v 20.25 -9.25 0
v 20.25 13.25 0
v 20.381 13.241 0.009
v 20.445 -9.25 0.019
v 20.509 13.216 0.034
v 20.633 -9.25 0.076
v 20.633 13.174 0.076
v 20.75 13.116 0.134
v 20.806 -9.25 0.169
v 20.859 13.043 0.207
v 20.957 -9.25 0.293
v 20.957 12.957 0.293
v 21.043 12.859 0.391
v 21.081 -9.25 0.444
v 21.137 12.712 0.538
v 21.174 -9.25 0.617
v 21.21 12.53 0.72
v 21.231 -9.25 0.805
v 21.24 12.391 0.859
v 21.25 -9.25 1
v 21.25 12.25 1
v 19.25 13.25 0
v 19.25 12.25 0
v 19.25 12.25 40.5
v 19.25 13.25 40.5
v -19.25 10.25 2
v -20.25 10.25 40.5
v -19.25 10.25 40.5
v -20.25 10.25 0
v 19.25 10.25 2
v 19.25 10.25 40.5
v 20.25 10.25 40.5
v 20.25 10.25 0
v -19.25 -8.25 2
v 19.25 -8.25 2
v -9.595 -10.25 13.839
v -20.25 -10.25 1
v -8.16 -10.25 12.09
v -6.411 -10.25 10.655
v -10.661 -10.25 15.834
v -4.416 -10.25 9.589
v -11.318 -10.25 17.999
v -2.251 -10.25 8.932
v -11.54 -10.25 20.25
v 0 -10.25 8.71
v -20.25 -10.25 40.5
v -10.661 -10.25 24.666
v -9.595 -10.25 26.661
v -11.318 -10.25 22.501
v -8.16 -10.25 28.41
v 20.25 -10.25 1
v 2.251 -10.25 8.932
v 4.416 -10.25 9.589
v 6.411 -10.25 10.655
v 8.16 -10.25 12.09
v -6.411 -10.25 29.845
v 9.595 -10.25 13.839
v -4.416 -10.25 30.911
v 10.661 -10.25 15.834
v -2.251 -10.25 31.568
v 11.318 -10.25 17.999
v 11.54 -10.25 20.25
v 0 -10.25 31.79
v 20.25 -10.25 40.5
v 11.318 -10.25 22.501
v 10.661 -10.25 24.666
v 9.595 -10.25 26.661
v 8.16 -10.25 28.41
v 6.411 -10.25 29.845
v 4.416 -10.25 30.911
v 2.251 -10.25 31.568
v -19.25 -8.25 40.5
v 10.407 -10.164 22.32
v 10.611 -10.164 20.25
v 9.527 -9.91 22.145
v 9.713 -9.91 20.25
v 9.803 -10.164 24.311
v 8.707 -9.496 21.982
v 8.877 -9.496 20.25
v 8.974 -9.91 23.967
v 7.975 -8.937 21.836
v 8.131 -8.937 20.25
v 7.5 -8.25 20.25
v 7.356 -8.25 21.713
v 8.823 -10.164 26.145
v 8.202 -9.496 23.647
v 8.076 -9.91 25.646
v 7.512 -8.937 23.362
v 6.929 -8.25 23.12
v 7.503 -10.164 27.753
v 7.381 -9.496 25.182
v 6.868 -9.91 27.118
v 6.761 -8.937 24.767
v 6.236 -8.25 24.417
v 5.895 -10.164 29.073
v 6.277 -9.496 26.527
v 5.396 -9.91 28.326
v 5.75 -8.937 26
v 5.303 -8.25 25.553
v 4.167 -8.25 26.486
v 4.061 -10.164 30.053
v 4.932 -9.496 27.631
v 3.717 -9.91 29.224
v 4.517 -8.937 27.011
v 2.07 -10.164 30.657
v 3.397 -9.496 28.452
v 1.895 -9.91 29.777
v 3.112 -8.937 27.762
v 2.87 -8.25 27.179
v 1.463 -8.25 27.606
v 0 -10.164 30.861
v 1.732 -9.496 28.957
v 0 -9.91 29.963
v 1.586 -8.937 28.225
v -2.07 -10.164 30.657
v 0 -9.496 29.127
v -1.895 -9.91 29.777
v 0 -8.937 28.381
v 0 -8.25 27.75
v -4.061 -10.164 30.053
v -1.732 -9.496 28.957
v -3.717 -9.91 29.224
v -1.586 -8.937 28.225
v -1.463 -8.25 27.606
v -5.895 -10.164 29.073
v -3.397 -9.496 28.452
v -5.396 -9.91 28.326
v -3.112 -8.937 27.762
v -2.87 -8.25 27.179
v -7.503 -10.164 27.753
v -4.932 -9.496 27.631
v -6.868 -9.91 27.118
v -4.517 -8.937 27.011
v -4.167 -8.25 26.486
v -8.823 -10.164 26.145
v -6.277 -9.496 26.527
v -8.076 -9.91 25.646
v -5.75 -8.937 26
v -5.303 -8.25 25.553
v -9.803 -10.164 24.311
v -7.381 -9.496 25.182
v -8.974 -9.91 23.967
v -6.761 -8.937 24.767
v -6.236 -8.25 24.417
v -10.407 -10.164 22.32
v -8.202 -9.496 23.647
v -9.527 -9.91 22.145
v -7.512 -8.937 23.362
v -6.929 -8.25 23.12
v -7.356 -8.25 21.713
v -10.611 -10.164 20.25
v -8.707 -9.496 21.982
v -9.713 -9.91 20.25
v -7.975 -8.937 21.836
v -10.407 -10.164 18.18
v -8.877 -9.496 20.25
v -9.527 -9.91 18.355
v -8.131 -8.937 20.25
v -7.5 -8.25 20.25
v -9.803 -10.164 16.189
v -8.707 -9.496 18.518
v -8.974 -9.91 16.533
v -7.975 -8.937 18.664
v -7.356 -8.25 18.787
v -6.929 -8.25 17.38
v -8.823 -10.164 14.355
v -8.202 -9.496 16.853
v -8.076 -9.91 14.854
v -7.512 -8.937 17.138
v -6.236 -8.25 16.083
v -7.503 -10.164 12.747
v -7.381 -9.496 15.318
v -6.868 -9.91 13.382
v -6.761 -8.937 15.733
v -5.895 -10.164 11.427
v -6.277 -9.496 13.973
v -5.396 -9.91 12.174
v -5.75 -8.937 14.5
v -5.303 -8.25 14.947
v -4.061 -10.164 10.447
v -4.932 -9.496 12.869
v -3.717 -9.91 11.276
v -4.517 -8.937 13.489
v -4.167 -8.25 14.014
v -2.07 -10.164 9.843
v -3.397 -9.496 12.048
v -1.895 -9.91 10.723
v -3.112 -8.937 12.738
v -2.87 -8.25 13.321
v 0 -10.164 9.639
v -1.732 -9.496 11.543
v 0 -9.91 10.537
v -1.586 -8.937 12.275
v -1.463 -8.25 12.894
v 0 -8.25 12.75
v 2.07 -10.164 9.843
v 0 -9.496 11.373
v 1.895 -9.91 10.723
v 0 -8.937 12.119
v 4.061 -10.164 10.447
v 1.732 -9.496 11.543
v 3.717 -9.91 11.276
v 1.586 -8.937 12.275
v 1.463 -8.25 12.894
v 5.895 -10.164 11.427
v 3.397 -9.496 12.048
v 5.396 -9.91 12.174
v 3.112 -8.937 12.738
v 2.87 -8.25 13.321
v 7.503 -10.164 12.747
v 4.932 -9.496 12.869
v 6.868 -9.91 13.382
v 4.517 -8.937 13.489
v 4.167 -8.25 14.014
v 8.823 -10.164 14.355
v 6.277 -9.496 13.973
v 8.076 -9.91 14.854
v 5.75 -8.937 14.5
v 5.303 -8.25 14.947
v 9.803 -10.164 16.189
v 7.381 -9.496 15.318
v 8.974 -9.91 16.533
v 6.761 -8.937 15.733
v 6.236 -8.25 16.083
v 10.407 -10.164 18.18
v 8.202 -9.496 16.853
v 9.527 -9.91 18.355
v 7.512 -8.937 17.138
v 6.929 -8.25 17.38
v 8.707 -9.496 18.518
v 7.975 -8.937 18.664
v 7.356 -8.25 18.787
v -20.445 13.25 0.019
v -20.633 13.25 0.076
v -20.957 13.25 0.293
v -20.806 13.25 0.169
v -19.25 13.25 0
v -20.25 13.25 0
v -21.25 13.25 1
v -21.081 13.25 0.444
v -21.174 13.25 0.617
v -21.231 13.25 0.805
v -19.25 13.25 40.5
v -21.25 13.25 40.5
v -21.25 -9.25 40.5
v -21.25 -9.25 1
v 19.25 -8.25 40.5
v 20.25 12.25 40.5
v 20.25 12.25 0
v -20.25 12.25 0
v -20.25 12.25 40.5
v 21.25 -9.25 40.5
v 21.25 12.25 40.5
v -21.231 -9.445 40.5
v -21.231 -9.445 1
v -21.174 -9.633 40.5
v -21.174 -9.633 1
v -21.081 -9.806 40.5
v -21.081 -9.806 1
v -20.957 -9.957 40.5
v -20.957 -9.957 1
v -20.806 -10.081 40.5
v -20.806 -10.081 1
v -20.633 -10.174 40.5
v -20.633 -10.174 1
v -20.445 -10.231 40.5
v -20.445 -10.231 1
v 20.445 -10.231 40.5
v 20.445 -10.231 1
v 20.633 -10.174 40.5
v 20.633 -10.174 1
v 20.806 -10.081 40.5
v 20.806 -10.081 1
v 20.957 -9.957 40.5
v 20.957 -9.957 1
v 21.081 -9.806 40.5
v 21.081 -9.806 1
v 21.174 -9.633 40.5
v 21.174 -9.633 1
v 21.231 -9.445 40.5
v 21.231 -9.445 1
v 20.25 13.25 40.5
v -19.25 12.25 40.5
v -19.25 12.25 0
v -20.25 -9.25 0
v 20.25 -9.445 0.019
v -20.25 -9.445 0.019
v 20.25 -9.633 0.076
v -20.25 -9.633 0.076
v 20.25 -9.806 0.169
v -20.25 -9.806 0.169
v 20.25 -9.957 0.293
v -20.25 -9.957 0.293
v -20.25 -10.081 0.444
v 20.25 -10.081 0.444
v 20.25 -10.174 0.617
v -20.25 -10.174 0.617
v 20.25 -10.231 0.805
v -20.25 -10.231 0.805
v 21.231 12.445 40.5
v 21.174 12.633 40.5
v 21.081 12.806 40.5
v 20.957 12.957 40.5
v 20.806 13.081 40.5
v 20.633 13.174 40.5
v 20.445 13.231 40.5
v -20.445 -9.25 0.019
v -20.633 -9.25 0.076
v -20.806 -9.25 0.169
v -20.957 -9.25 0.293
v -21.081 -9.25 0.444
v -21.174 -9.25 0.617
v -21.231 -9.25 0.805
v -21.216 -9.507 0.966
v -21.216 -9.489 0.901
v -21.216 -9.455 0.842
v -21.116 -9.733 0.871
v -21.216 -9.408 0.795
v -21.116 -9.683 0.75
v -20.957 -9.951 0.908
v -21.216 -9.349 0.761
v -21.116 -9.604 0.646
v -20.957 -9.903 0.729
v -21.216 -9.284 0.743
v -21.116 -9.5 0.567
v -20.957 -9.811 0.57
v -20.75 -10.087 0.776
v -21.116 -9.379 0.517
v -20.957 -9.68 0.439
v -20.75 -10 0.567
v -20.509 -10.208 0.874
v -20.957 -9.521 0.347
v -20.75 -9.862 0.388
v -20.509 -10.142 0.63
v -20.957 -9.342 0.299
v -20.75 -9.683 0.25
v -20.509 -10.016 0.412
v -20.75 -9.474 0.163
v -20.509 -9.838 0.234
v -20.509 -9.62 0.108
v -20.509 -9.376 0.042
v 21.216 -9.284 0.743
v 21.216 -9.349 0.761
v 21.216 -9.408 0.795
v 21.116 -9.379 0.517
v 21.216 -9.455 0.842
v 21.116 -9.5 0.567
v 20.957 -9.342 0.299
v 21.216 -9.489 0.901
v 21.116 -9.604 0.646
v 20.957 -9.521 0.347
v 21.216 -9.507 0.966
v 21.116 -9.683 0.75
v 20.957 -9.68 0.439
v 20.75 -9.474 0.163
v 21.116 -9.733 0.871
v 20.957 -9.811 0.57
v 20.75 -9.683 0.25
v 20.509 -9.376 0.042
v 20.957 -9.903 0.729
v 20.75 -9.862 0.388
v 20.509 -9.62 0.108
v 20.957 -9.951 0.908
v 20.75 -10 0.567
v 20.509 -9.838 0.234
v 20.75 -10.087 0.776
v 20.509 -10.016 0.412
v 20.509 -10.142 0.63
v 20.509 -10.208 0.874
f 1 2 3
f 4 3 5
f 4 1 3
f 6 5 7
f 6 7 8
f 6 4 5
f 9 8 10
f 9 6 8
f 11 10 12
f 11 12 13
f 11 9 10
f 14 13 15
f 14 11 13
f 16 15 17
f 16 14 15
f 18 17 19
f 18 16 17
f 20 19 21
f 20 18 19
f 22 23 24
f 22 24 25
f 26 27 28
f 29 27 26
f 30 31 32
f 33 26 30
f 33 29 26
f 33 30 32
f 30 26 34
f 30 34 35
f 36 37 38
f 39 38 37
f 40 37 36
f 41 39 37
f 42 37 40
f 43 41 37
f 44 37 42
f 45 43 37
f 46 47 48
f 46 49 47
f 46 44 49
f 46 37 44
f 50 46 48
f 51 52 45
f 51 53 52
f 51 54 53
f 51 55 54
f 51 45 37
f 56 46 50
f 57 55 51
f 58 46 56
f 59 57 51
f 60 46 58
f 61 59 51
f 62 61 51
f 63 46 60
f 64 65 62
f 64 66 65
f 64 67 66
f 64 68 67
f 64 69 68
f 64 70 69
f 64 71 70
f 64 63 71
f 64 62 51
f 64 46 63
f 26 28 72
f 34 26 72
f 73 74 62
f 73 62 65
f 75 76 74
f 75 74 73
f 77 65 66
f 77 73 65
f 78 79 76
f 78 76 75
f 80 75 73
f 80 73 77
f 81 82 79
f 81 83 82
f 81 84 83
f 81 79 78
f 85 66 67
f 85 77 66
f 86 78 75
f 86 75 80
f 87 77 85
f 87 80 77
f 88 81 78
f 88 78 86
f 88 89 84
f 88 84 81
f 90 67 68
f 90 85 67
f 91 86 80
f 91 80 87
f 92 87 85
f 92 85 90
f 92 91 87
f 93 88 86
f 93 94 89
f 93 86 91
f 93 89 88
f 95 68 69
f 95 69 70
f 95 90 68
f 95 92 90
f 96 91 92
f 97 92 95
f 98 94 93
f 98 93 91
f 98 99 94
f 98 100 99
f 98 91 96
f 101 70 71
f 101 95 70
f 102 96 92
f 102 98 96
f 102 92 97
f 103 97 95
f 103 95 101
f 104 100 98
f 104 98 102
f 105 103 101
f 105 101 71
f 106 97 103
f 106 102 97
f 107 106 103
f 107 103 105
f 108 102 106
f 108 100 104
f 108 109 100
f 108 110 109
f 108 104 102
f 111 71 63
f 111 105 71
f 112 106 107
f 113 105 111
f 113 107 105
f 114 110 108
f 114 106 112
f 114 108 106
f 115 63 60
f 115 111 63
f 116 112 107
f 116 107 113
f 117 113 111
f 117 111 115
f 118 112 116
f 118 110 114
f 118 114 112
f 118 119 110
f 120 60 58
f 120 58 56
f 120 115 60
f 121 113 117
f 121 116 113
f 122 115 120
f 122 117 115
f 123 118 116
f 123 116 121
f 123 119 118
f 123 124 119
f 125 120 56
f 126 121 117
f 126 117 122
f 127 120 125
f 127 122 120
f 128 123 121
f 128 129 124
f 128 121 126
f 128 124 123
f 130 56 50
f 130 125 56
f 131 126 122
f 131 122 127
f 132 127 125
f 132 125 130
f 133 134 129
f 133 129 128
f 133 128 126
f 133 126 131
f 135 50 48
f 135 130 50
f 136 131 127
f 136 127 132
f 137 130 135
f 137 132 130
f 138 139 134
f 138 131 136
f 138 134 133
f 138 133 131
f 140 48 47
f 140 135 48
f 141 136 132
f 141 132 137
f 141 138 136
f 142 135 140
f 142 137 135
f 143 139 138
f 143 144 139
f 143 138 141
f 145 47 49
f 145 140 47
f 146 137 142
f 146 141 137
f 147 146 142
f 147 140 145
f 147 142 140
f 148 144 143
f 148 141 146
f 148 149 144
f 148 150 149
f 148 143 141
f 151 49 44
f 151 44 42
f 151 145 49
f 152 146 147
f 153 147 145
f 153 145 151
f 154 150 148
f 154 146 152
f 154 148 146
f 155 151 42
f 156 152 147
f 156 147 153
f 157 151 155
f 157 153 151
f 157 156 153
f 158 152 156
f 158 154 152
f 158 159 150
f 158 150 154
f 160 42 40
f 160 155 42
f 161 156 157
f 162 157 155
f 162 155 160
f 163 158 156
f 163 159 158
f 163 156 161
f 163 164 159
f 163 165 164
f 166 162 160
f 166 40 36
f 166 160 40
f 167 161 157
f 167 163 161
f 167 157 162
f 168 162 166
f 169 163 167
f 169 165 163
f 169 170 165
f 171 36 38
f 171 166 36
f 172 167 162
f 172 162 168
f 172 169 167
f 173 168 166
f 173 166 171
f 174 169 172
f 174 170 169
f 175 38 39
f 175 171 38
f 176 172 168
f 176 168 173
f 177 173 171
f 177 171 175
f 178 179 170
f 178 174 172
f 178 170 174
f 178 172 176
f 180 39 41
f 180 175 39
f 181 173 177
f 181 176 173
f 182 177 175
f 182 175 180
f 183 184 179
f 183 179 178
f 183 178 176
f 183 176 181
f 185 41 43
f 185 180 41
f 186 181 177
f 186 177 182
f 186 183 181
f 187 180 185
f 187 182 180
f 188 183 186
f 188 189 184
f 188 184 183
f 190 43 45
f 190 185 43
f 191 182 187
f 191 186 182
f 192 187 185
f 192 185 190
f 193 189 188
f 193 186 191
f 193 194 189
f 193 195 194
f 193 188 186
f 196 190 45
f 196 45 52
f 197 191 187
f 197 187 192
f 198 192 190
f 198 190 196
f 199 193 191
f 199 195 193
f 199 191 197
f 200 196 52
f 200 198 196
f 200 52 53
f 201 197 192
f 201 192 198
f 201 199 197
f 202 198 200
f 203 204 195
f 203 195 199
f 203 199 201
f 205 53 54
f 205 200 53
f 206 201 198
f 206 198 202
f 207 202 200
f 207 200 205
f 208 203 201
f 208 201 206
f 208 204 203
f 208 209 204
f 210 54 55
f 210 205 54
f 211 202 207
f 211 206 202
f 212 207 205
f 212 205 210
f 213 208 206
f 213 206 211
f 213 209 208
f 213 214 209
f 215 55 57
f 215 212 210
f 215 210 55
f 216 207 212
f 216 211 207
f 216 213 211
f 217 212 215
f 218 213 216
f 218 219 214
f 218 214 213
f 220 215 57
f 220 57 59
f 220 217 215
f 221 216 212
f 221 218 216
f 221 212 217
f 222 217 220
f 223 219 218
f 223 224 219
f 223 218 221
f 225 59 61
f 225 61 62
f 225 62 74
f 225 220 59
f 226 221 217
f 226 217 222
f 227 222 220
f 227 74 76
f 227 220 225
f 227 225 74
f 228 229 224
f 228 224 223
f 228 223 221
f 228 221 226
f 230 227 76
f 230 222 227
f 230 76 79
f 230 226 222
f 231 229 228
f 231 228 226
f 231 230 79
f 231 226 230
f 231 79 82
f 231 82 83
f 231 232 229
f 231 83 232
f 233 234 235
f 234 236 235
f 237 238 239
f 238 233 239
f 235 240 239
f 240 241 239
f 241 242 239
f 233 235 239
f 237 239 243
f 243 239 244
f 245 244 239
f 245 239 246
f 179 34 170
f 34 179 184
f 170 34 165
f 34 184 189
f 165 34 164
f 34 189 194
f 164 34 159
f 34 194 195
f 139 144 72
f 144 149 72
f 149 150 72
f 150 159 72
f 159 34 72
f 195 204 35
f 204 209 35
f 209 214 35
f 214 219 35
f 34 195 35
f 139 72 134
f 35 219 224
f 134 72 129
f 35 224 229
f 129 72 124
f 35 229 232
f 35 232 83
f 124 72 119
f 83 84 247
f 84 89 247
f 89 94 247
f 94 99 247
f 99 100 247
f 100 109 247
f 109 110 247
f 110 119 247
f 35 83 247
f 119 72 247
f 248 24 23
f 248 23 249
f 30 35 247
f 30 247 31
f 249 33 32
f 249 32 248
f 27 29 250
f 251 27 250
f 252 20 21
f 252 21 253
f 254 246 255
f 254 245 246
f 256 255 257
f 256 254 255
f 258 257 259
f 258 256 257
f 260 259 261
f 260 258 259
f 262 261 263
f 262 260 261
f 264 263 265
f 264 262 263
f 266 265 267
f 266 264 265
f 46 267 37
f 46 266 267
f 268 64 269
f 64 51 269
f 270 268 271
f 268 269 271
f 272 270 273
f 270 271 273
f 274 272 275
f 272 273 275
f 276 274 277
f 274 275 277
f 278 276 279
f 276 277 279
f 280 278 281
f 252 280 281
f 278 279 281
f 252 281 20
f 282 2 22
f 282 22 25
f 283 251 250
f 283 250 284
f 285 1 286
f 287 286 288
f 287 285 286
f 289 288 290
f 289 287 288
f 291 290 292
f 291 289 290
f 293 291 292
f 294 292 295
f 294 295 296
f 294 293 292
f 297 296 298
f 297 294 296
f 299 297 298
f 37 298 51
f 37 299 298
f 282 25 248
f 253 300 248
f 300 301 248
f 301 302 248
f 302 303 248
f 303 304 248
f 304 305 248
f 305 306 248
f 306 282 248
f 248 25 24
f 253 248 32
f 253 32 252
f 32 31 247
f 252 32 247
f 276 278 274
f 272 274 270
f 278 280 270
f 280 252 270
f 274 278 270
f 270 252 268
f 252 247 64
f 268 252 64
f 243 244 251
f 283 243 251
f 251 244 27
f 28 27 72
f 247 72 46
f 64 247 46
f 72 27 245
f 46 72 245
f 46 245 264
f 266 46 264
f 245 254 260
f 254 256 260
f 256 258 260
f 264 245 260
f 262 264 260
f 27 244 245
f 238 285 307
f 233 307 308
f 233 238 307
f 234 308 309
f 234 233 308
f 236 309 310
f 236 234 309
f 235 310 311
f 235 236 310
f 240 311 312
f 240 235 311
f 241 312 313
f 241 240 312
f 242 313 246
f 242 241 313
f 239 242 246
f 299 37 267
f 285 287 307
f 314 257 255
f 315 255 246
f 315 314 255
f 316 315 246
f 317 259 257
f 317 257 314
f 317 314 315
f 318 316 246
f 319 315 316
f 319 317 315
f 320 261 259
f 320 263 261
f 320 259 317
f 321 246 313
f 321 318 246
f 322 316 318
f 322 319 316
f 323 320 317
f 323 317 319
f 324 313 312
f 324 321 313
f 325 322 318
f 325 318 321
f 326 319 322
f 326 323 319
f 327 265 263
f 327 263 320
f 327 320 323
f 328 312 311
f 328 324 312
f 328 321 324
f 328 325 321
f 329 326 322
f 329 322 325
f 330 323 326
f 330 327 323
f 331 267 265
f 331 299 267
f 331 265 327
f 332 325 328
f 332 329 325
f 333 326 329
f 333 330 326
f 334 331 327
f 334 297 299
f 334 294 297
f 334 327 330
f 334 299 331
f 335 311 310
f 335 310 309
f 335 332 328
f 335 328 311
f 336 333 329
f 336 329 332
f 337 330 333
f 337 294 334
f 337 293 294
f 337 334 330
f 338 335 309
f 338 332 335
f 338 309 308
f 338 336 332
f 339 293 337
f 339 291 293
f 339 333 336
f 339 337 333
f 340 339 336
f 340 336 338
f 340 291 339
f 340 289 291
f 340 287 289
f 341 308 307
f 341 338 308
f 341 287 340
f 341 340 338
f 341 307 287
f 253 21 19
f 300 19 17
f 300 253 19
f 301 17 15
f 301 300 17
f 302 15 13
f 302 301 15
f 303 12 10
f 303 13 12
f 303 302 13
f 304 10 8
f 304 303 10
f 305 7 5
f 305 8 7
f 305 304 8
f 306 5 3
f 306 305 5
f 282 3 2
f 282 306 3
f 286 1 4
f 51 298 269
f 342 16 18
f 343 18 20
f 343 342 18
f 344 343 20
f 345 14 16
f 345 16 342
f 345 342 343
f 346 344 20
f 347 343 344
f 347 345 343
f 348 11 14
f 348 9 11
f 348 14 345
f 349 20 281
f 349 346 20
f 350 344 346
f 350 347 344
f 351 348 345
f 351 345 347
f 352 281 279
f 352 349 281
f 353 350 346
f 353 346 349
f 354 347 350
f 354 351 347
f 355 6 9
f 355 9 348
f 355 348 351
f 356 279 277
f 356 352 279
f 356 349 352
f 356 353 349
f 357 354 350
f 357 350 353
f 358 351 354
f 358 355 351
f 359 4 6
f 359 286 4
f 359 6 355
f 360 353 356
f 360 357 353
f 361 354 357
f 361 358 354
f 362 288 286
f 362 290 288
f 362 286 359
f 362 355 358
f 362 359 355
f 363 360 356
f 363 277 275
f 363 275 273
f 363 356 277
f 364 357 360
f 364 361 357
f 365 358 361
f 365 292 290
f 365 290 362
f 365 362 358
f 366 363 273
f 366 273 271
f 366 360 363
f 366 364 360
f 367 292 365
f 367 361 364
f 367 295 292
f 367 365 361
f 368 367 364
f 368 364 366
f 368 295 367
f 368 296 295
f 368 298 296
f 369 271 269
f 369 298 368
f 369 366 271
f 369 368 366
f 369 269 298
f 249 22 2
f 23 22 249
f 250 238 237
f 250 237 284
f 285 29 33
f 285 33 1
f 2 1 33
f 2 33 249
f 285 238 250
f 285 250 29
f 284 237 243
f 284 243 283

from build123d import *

# Parameters (mm, degrees)
F2_W      = 42.5
F2_H      = 40.5
F2_R      = 7.5
F8_DEPTH  = 2
F6_W      = 23.5
F6_H      = 40.5
F9_DEPTH  = 2
F5_W      = 23.5
F5_H      = 40.5
F10_DEPTH = 2
F0_W      = 42.5
F0_H      = 20.5
F11_DEPTH = 2
F7_W      = 1
F7_H      = 2
F12_DEPTH = 38.5
F13_DEPTH = 40.5
F14_R     = 0.99999


# Not quite as in the source:
# - a fillet or chamfer that OpenCascade refuses, or shapes differently, is made with other operations: its cross-section is extruded or revolved along the edge and cut away or added
# - a fillet or chamfer is up to 0.001 mm smaller than in the source, because OpenCascade refuses the exact size


with BuildPart() as f8:
    # F2 (on line) → F8 (new body)
    with BuildSketch(Plane.XZ.offset(10.25)):
        with Locations((0, 20.25)):
            Rectangle(F2_W, F2_H)
        with Locations((0, 20.25)):
            Circle(F2_R, mode=Mode.SUBTRACT)
    extrude(amount=-F8_DEPTH)

    # F6 (on line) → F9 (join)
    with BuildSketch(Plane(origin=(-21.25, 0, 0), x_dir=(0, -1, 0), z_dir=(-1, 0, 0))):
        with Locations((-1.5, 20.25)):
            Rectangle(F6_W, F6_H)
    extrude(amount=-F9_DEPTH)

    # F5 (on line) → F10 (join)
    with BuildSketch(Plane.YZ.offset(21.25)):
        with Locations((1.5, 20.25)):
            Rectangle(F5_W, F5_H)
    extrude(amount=-F10_DEPTH)

    # F0 (on Top) → F11 (join)
    with BuildSketch(Plane.XY):
        Rectangle(F0_W, F0_H)
    extrude(amount=F11_DEPTH)

    # F7 (on Top) → F12 (cut)
    with BuildSketch(Plane.XY):
        with Locations((-19.75, 11.25)):
            Rectangle(F7_W, F7_H)
        with Locations((19.75, 11.25)):
            Rectangle(F7_W, F7_H)
    extrude(amount=-F12_DEPTH, mode=Mode.SUBTRACT)

    # F7 (on Top) → F13 (cut)
    with BuildSketch(Plane.XY):
        with Locations((19.75, 11.25)):
            Rectangle(F7_W, F7_H)
        with Locations((-19.75, 11.25)):
            Rectangle(F7_W, F7_H)
    extrude(amount=F13_DEPTH, mode=Mode.SUBTRACT)

    # F14 (radius 1 in the source; OpenCascade refuses exactly that, so slightly less here)
    f14_edges = [f8.edges().sort_by_distance(p)[0] for p in [
        (0, -10.25, 0),
        (21.25, 1.5, 0),
        (21.25, 13.25, 20.25),
        (21.25, -10.25, 20.25),
        (-21.25, -10.25, 20.25),
        (-21.25, 1.5, 0),
    ]]
    fillet(f14_edges, radius=F14_R)

    # F15: fillet of radius 5.08 on 1 edges, made by hand

    # F15_s1 → F15_t2 (revolve, cut)
    with BuildSketch(Plane.XY.offset(20.25)):
        with BuildLine():
            ThreePointArc((11.5398019753, -10.25), (9.2859164414, -9.7226256161), (7.5, -8.25))
            Line((7.5, -8.25), (7.5, -10.25))
            Line((7.5, -10.25), (11.5398019753, -10.25))
        make_face()
    revolve(axis=Axis((0, -10.25, 20.25), (0, -1, 0)), mode=Mode.SUBTRACT)


solid = f8.part
